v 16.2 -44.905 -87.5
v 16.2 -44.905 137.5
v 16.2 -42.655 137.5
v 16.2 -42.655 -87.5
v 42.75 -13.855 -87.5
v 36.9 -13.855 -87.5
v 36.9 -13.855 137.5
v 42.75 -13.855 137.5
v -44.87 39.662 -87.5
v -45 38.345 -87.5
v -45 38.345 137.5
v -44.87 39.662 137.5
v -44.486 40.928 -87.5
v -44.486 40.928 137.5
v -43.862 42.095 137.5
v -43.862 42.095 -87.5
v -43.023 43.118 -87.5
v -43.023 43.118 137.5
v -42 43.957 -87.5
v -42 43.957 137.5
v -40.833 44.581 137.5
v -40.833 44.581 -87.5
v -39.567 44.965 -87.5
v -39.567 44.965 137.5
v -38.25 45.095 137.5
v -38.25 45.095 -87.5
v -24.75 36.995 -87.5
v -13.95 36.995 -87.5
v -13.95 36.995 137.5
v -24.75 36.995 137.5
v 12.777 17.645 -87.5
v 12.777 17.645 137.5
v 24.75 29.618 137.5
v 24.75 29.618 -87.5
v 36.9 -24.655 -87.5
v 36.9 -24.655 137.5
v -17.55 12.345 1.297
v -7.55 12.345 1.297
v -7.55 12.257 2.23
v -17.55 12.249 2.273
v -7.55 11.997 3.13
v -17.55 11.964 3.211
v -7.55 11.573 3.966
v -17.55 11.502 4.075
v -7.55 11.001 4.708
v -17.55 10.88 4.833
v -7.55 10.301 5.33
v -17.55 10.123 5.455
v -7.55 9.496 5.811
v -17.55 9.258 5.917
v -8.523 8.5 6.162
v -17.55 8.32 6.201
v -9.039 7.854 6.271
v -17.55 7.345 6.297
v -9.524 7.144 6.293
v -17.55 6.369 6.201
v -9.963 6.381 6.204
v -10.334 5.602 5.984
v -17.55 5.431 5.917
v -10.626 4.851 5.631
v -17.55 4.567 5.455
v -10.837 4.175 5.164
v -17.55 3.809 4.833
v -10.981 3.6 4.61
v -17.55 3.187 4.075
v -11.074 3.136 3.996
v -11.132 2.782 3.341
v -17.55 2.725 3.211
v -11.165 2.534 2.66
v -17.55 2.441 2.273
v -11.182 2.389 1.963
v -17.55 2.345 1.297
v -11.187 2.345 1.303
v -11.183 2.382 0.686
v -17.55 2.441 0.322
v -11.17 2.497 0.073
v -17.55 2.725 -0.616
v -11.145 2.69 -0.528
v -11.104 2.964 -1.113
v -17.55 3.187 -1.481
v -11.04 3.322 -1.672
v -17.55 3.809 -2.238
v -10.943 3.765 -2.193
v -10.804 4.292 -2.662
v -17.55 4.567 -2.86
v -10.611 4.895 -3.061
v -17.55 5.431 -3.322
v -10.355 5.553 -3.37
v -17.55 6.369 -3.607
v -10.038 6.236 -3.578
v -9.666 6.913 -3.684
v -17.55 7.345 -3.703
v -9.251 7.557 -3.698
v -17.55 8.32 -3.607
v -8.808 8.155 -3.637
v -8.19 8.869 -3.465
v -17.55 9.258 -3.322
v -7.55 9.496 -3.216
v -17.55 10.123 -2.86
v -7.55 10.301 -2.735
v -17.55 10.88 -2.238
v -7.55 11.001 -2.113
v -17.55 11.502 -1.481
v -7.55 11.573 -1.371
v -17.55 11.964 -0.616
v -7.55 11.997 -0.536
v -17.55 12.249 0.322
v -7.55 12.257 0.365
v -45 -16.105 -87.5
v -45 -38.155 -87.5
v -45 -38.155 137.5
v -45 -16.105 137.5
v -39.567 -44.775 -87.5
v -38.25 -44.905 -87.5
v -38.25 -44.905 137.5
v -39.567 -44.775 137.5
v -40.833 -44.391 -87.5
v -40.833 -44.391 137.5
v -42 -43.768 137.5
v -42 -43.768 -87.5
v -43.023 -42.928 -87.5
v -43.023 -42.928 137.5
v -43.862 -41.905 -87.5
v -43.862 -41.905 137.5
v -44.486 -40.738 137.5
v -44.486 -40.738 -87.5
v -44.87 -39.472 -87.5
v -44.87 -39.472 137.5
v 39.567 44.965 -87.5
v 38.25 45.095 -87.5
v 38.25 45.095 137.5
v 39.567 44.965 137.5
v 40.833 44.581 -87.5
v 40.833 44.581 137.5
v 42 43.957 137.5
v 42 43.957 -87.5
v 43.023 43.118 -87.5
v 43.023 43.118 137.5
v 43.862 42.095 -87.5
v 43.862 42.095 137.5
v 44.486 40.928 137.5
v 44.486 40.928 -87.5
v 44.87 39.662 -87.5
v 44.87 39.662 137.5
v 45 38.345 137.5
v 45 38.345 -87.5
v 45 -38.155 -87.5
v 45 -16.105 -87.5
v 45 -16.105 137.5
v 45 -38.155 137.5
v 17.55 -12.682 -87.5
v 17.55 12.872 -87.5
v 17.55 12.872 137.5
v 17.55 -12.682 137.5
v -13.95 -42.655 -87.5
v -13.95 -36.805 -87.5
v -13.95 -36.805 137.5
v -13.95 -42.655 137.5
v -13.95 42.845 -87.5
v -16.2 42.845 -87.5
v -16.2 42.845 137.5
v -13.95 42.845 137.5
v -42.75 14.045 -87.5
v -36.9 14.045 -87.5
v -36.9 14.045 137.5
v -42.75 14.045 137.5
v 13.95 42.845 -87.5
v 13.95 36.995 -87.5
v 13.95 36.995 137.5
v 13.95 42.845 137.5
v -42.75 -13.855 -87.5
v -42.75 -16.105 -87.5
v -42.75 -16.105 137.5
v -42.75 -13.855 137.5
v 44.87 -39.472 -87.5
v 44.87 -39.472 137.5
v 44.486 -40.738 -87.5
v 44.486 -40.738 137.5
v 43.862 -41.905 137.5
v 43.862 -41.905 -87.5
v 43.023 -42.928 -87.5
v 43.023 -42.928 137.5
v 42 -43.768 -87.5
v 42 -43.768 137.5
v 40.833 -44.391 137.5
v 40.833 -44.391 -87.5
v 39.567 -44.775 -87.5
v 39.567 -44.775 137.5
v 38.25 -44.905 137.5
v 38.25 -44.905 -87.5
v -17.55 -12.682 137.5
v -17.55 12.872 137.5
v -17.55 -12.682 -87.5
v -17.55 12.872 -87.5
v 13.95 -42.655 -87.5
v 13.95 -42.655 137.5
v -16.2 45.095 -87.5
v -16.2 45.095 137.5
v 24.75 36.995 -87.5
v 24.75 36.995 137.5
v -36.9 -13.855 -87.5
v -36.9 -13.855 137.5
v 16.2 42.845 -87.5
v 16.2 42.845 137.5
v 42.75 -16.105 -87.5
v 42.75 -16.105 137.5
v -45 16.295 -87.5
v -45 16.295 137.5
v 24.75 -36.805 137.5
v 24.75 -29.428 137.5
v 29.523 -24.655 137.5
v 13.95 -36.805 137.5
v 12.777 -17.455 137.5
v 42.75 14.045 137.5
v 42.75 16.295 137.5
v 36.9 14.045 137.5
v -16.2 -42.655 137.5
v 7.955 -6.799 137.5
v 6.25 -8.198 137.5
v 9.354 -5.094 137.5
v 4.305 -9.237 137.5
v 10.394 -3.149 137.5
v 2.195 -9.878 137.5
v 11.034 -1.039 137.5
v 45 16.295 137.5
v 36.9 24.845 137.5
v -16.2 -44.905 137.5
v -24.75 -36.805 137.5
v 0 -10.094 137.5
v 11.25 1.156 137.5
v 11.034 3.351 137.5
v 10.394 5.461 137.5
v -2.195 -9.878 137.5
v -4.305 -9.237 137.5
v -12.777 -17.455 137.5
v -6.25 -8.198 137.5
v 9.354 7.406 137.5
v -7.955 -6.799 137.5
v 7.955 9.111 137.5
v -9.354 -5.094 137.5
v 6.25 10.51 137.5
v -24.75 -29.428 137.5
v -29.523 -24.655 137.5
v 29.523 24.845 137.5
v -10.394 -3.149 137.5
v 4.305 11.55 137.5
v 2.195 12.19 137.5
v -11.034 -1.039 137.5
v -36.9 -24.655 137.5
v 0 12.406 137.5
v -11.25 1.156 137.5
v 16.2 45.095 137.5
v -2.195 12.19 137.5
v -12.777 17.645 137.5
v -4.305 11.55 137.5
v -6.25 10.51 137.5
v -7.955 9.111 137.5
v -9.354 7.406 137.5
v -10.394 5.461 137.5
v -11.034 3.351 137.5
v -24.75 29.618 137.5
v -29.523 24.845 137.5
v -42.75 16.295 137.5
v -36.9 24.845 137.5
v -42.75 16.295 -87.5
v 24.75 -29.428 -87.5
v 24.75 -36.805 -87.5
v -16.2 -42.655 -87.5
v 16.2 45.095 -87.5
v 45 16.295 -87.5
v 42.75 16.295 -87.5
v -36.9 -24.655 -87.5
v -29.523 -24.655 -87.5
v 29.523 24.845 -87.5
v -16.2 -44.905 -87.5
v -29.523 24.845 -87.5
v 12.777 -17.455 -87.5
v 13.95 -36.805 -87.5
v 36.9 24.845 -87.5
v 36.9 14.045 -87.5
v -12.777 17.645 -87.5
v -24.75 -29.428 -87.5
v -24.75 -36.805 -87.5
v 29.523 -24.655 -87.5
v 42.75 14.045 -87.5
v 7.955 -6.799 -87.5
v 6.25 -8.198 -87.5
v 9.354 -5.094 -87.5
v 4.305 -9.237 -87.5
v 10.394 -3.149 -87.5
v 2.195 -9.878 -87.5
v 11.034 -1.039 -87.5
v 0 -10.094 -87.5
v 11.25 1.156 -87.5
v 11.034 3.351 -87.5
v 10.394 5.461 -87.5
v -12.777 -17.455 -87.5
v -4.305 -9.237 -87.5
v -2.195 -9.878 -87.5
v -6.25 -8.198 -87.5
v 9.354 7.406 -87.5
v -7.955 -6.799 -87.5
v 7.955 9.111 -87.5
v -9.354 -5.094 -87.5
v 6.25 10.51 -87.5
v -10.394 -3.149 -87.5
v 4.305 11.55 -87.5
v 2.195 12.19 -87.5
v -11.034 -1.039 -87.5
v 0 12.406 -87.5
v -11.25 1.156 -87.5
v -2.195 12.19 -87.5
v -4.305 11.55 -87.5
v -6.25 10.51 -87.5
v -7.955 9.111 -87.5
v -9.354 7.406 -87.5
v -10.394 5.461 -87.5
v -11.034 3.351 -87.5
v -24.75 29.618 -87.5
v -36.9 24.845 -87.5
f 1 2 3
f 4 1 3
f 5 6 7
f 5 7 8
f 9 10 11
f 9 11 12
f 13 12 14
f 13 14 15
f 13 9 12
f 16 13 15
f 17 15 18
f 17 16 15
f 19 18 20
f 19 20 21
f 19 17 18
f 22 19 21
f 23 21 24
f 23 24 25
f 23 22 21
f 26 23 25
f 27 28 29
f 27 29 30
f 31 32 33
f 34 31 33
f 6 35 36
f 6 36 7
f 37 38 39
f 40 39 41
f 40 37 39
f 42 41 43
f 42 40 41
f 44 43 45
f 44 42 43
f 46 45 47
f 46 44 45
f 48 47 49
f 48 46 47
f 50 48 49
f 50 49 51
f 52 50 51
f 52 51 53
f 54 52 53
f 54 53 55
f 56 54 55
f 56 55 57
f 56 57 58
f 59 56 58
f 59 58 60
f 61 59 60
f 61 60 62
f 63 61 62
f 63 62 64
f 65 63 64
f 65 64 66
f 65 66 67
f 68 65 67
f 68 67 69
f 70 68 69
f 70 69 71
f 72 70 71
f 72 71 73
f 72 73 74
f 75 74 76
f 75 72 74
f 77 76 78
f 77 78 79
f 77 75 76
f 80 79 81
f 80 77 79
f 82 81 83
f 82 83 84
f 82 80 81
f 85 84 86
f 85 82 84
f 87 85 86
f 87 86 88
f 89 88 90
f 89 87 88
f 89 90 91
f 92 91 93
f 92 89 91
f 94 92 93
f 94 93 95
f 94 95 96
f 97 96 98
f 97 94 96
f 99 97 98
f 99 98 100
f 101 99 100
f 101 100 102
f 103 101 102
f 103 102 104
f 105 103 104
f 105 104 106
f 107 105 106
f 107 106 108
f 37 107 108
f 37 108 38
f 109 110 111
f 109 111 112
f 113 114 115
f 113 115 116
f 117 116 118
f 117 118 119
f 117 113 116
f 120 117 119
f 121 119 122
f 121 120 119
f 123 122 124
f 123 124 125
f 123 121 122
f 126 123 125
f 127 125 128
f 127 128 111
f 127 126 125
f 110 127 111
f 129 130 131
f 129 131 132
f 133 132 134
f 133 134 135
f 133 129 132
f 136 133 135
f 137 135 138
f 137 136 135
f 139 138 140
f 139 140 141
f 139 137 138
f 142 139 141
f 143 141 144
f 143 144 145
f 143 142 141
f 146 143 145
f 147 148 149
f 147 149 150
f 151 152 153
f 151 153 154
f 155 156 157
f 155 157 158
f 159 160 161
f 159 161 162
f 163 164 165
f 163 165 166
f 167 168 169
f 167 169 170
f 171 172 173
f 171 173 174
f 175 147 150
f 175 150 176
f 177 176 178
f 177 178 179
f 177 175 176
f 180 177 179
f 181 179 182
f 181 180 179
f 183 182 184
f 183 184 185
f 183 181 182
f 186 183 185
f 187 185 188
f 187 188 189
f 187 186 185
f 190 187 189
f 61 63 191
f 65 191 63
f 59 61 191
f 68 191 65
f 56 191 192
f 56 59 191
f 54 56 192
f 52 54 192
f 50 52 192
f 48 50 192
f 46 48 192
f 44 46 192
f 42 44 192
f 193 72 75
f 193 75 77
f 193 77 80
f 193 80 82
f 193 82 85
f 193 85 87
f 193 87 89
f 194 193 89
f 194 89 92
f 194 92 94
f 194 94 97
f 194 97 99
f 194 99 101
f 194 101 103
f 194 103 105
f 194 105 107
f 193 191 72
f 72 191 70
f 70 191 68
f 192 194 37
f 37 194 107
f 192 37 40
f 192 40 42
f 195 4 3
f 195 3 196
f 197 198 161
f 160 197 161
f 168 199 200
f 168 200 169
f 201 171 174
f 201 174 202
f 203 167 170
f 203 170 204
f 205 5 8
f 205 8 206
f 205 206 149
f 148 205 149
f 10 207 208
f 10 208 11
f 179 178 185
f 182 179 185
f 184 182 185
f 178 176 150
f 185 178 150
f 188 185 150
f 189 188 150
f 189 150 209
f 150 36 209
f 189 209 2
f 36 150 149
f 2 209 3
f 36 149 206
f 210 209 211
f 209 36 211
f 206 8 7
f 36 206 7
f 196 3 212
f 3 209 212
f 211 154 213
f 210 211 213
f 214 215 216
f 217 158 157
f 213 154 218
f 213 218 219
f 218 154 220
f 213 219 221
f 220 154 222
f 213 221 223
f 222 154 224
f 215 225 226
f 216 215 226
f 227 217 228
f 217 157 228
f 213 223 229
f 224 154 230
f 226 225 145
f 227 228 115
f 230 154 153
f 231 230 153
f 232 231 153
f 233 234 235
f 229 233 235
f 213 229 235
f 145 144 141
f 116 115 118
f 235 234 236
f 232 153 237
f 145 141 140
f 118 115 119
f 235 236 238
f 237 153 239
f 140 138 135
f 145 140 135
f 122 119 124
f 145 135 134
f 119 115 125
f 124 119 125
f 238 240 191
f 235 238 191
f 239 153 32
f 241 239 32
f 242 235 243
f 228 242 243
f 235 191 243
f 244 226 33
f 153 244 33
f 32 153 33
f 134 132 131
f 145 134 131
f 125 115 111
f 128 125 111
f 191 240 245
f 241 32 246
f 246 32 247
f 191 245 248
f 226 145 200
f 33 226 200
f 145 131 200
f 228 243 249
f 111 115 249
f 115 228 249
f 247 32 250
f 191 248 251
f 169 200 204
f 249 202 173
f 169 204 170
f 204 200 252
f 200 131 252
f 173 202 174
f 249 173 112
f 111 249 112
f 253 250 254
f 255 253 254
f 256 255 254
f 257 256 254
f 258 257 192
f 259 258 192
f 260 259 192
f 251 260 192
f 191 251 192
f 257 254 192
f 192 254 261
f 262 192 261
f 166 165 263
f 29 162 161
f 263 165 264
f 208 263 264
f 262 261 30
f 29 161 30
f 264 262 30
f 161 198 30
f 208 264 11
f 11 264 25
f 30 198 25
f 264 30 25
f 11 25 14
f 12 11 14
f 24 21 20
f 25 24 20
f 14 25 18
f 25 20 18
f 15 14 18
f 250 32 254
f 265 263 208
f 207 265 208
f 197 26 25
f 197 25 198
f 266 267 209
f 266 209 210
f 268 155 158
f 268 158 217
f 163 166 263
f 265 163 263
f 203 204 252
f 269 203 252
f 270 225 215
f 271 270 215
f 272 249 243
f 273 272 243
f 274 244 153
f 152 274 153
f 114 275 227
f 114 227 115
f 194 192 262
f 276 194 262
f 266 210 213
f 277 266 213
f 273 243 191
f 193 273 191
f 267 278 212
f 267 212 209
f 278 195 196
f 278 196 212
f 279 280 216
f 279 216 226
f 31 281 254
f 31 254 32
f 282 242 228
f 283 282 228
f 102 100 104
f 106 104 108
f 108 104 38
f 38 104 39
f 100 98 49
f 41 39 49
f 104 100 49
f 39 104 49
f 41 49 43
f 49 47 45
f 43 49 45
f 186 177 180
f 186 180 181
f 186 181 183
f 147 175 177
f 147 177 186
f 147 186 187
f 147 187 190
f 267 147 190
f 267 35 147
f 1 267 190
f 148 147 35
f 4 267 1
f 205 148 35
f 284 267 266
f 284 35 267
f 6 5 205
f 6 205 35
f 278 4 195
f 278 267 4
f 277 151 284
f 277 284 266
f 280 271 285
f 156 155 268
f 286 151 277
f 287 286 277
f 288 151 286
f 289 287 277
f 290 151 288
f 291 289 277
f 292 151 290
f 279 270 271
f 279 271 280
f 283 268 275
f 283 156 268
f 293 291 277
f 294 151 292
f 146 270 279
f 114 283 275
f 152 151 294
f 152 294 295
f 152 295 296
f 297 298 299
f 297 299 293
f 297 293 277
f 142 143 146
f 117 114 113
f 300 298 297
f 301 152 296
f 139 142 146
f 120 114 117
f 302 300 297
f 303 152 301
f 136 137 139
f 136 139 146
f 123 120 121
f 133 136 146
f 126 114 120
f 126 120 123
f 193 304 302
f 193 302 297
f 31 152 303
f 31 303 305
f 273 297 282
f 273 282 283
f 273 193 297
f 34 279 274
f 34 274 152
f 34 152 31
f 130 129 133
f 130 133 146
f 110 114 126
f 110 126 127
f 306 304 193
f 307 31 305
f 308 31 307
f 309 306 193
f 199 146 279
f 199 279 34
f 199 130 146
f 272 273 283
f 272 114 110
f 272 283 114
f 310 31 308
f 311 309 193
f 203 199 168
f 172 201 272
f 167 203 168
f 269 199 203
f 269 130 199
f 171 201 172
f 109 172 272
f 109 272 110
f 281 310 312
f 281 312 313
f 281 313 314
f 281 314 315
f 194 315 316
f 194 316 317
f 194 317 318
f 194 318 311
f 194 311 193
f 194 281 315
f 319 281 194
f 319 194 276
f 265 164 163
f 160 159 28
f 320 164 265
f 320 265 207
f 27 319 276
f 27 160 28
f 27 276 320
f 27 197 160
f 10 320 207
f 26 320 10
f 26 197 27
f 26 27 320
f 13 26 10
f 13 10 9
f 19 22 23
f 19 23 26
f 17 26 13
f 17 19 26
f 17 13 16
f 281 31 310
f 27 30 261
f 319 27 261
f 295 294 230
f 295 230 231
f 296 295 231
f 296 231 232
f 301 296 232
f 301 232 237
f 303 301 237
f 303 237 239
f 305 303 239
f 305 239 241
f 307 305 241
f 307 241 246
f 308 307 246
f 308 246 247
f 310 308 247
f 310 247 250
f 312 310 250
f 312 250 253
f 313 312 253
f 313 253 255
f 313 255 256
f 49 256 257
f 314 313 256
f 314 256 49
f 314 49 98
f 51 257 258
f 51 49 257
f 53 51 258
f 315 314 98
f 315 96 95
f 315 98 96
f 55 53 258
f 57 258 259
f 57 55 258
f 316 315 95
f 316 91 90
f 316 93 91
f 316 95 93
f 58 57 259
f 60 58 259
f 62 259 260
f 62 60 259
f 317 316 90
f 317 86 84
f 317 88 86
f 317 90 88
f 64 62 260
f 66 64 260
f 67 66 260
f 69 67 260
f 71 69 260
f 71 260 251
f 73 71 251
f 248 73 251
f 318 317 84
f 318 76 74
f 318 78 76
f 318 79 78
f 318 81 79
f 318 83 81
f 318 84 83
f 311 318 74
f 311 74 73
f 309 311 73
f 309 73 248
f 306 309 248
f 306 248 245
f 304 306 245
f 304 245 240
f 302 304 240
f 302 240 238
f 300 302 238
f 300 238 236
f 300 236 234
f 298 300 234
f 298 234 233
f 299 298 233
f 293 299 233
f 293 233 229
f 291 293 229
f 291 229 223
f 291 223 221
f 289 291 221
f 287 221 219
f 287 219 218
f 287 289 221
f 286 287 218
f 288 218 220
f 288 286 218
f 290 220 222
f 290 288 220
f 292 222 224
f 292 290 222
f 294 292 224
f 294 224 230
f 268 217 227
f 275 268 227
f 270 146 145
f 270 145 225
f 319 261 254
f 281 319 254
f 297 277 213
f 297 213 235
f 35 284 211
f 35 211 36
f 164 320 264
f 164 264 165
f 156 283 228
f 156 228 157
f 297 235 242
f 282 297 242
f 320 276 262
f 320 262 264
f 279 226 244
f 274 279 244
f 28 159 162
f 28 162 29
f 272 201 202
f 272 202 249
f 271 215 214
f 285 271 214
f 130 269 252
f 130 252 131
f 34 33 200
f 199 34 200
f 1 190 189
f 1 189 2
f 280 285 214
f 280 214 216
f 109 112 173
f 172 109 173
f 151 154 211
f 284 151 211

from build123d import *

# Parameters (mm, degrees)
SKETCH1_R           = 2.5
BOSS_EXTRUDE1_DEPTH = 50
SCALE_2_SCALE       = 3
SCALE_3_SCALE       = 6
SCALE_5_SCALE       = 2
SCALE_6_SCALE       = 0.25
SCALE_7_SCALE       = 0.125
SCALE_8_SCALE       = 0.25
SCALE_9_SCALE       = 4
SCALE_10_SCALE      = 4
OTHER_START         = -17.55
OTHER_1_OUTLINE_R   = 5
OTHER_1_DEPTH       = 10


# Read off the part's stored shape, not the designer's step: 孔1
with BuildPart() as part:
    # Sketch1 → Boss-Extrude1 (new body)
    with BuildSketch(Plane.XY):
        with BuildLine():
            Line((2.839339828, 3.9), (5.5, 6.560660172))
            Line((5.5, 6.560660172), (5.5, 8.2))
            Line((5.5, 8.2), (3.1, 8.2))
            Line((3.1, 8.2), (3.1, 9.5))
            Line((3.1, 9.5), (3.6, 9.5))
            Line((3.6, 9.5), (3.6, 10))
            Line((3.6, 10), (8.5, 10))
            ThreePointArc((8.5, 10), (9.560660172, 9.560660172), (10, 8.5))
            Line((10, 8.5), (10, 3.6))
            Line((10, 3.6), (9.5, 3.6))
            Line((9.5, 3.6), (9.5, 3.1))
            Line((9.5, 3.1), (8.2, 3.1))
            Line((8.2, 3.1), (8.2, 5.5))
            Line((8.2, 5.5), (6.560660172, 5.5))
            Line((6.560660172, 5.5), (3.9, 2.839339828))
            Line((3.9, 2.839339828), (3.9, -2.839339828))
            Line((3.9, -2.839339828), (6.560660172, -5.5))
            Line((6.560660172, -5.5), (8.2, -5.5))
            Line((8.2, -5.5), (8.2, -3.1))
            Line((8.2, -3.1), (9.5, -3.1))
            Line((9.5, -3.1), (9.5, -3.6))
            Line((9.5, -3.6), (10, -3.6))
            Line((10, -3.6), (10, -8.5))
            ThreePointArc((10, -8.5), (9.560660172, -9.560660172), (8.5, -10))
            Line((8.5, -10), (3.6, -10))
            Line((3.6, -10), (3.6, -9.5))
            Line((3.6, -9.5), (3.1, -9.5))
            Line((3.1, -9.5), (3.1, -8.2))
            Line((3.1, -8.2), (5.5, -8.2))
            Line((5.5, -8.2), (5.5, -6.560660172))
            Line((5.5, -6.560660172), (2.839339828, -3.9))
            Line((2.839339828, -3.9), (-2.839339828, -3.9))
            Line((-2.839339828, -3.9), (-5.5, -6.560660172))
            Line((-5.5, -6.560660172), (-5.5, -8.2))
            Line((-5.5, -8.2), (-3.1, -8.2))
            Line((-3.1, -8.2), (-3.1, -9.5))
            Line((-3.1, -9.5), (-3.6, -9.5))
            Line((-3.6, -9.5), (-3.6, -10))
            Line((-3.6, -10), (-8.5, -10))
            ThreePointArc((-8.5, -10), (-9.560660172, -9.560660172), (-10, -8.5))
            Line((-10, -8.5), (-10, -3.6))
            Line((-10, -3.6), (-9.5, -3.6))
            Line((-9.5, -3.6), (-9.5, -3.1))
            Line((-9.5, -3.1), (-8.2, -3.1))
            Line((-8.2, -3.1), (-8.2, -5.5))
            Line((-8.2, -5.5), (-6.560660172, -5.5))
            Line((-6.560660172, -5.5), (-3.9, -2.839339828))
            Line((-3.9, -2.839339828), (-3.9, 2.839339828))
            Line((-3.9, 2.839339828), (-6.560660172, 5.5))
            Line((-6.560660172, 5.5), (-8.2, 5.5))
            Line((-8.2, 5.5), (-8.2, 3.1))
            Line((-8.2, 3.1), (-9.5, 3.1))
            Line((-9.5, 3.1), (-9.5, 3.6))
            Line((-9.5, 3.6), (-10, 3.6))
            Line((-10, 3.6), (-10, 8.5))
            ThreePointArc((-10, 8.5), (-9.560660172, 9.560660172), (-8.5, 10))
            Line((-8.5, 10), (-3.6, 10))
            Line((-3.6, 10), (-3.6, 9.5))
            Line((-3.6, 9.5), (-3.1, 9.5))
            Line((-3.1, 9.5), (-3.1, 8.2))
            Line((-3.1, 8.2), (-5.5, 8.2))
            Line((-5.5, 8.2), (-5.5, 6.560660172))
            Line((-5.5, 6.560660172), (-2.839339828, 3.9))
            Line((-2.839339828, 3.9), (2.839339828, 3.9))
        make_face()
        with Locations((0, 0.235847297)):
            Circle(SKETCH1_R, mode=Mode.SUBTRACT)
    extrude(amount=BOSS_EXTRUDE1_DEPTH)


with BuildPart() as part_1:
    # 缩放比例2: scaled about (0, -0.027095247, 25)
    add(part.part.scale(SCALE_2_SCALE).moved(Location((0, 0.054190494, -50))))


with BuildPart() as part_2:
    # 缩放比例3: scaled about (0, -0.027095247, 25)
    add(part_1.part.scale(SCALE_3_SCALE).moved(Location((0, 0.135476235, -125))))


with BuildPart() as part_3:
    # 缩放比例5: scaled about (0, -0.027095249, 25)
    add(part_2.part.scale(SCALE_5_SCALE).moved(Location((0, 0.027095249, -25))))


with BuildPart() as part_4:
    # 缩放比例6: scaled about (0, -0.027095249, 25)
    add(part_3.part.scale(SCALE_6_SCALE).moved(Location((0, -0.020321437, 18.75))))


with BuildPart() as part_5:
    # 缩放比例7: scaled about (0, -0.027095249, 25)
    add(part_4.part.scale(SCALE_7_SCALE).moved(Location((0, -0.023708343, 21.875))))


with BuildPart() as part_6:
    # 缩放比例8: scaled about (0, -0.027095249, 25)
    add(part_5.part.scale(SCALE_8_SCALE).moved(Location((0, -0.020321437, 18.75))))


with BuildPart() as part_7:
    # 缩放比例9: scaled about (0, -0.027095249, 25)
    add(part_6.part.scale(SCALE_9_SCALE).moved(Location((0, 0.081285747, -75))))


with BuildPart() as part_8:
    # 缩放比例10: scaled about (0, -0.027095249, 25)
    add(part_7.part.scale(SCALE_10_SCALE).moved(Location((0, 0.081285747, -75))))

    # 孔1 outline → 孔1 (cut)
    with BuildSketch(Plane.YZ.offset(OTHER_START)):
        with Locations((7.344833538, 1.297306883)):
            Circle(OTHER_1_OUTLINE_R)
    extrude(amount=OTHER_1_DEPTH, mode=Mode.SUBTRACT)


solid = part_8.part
